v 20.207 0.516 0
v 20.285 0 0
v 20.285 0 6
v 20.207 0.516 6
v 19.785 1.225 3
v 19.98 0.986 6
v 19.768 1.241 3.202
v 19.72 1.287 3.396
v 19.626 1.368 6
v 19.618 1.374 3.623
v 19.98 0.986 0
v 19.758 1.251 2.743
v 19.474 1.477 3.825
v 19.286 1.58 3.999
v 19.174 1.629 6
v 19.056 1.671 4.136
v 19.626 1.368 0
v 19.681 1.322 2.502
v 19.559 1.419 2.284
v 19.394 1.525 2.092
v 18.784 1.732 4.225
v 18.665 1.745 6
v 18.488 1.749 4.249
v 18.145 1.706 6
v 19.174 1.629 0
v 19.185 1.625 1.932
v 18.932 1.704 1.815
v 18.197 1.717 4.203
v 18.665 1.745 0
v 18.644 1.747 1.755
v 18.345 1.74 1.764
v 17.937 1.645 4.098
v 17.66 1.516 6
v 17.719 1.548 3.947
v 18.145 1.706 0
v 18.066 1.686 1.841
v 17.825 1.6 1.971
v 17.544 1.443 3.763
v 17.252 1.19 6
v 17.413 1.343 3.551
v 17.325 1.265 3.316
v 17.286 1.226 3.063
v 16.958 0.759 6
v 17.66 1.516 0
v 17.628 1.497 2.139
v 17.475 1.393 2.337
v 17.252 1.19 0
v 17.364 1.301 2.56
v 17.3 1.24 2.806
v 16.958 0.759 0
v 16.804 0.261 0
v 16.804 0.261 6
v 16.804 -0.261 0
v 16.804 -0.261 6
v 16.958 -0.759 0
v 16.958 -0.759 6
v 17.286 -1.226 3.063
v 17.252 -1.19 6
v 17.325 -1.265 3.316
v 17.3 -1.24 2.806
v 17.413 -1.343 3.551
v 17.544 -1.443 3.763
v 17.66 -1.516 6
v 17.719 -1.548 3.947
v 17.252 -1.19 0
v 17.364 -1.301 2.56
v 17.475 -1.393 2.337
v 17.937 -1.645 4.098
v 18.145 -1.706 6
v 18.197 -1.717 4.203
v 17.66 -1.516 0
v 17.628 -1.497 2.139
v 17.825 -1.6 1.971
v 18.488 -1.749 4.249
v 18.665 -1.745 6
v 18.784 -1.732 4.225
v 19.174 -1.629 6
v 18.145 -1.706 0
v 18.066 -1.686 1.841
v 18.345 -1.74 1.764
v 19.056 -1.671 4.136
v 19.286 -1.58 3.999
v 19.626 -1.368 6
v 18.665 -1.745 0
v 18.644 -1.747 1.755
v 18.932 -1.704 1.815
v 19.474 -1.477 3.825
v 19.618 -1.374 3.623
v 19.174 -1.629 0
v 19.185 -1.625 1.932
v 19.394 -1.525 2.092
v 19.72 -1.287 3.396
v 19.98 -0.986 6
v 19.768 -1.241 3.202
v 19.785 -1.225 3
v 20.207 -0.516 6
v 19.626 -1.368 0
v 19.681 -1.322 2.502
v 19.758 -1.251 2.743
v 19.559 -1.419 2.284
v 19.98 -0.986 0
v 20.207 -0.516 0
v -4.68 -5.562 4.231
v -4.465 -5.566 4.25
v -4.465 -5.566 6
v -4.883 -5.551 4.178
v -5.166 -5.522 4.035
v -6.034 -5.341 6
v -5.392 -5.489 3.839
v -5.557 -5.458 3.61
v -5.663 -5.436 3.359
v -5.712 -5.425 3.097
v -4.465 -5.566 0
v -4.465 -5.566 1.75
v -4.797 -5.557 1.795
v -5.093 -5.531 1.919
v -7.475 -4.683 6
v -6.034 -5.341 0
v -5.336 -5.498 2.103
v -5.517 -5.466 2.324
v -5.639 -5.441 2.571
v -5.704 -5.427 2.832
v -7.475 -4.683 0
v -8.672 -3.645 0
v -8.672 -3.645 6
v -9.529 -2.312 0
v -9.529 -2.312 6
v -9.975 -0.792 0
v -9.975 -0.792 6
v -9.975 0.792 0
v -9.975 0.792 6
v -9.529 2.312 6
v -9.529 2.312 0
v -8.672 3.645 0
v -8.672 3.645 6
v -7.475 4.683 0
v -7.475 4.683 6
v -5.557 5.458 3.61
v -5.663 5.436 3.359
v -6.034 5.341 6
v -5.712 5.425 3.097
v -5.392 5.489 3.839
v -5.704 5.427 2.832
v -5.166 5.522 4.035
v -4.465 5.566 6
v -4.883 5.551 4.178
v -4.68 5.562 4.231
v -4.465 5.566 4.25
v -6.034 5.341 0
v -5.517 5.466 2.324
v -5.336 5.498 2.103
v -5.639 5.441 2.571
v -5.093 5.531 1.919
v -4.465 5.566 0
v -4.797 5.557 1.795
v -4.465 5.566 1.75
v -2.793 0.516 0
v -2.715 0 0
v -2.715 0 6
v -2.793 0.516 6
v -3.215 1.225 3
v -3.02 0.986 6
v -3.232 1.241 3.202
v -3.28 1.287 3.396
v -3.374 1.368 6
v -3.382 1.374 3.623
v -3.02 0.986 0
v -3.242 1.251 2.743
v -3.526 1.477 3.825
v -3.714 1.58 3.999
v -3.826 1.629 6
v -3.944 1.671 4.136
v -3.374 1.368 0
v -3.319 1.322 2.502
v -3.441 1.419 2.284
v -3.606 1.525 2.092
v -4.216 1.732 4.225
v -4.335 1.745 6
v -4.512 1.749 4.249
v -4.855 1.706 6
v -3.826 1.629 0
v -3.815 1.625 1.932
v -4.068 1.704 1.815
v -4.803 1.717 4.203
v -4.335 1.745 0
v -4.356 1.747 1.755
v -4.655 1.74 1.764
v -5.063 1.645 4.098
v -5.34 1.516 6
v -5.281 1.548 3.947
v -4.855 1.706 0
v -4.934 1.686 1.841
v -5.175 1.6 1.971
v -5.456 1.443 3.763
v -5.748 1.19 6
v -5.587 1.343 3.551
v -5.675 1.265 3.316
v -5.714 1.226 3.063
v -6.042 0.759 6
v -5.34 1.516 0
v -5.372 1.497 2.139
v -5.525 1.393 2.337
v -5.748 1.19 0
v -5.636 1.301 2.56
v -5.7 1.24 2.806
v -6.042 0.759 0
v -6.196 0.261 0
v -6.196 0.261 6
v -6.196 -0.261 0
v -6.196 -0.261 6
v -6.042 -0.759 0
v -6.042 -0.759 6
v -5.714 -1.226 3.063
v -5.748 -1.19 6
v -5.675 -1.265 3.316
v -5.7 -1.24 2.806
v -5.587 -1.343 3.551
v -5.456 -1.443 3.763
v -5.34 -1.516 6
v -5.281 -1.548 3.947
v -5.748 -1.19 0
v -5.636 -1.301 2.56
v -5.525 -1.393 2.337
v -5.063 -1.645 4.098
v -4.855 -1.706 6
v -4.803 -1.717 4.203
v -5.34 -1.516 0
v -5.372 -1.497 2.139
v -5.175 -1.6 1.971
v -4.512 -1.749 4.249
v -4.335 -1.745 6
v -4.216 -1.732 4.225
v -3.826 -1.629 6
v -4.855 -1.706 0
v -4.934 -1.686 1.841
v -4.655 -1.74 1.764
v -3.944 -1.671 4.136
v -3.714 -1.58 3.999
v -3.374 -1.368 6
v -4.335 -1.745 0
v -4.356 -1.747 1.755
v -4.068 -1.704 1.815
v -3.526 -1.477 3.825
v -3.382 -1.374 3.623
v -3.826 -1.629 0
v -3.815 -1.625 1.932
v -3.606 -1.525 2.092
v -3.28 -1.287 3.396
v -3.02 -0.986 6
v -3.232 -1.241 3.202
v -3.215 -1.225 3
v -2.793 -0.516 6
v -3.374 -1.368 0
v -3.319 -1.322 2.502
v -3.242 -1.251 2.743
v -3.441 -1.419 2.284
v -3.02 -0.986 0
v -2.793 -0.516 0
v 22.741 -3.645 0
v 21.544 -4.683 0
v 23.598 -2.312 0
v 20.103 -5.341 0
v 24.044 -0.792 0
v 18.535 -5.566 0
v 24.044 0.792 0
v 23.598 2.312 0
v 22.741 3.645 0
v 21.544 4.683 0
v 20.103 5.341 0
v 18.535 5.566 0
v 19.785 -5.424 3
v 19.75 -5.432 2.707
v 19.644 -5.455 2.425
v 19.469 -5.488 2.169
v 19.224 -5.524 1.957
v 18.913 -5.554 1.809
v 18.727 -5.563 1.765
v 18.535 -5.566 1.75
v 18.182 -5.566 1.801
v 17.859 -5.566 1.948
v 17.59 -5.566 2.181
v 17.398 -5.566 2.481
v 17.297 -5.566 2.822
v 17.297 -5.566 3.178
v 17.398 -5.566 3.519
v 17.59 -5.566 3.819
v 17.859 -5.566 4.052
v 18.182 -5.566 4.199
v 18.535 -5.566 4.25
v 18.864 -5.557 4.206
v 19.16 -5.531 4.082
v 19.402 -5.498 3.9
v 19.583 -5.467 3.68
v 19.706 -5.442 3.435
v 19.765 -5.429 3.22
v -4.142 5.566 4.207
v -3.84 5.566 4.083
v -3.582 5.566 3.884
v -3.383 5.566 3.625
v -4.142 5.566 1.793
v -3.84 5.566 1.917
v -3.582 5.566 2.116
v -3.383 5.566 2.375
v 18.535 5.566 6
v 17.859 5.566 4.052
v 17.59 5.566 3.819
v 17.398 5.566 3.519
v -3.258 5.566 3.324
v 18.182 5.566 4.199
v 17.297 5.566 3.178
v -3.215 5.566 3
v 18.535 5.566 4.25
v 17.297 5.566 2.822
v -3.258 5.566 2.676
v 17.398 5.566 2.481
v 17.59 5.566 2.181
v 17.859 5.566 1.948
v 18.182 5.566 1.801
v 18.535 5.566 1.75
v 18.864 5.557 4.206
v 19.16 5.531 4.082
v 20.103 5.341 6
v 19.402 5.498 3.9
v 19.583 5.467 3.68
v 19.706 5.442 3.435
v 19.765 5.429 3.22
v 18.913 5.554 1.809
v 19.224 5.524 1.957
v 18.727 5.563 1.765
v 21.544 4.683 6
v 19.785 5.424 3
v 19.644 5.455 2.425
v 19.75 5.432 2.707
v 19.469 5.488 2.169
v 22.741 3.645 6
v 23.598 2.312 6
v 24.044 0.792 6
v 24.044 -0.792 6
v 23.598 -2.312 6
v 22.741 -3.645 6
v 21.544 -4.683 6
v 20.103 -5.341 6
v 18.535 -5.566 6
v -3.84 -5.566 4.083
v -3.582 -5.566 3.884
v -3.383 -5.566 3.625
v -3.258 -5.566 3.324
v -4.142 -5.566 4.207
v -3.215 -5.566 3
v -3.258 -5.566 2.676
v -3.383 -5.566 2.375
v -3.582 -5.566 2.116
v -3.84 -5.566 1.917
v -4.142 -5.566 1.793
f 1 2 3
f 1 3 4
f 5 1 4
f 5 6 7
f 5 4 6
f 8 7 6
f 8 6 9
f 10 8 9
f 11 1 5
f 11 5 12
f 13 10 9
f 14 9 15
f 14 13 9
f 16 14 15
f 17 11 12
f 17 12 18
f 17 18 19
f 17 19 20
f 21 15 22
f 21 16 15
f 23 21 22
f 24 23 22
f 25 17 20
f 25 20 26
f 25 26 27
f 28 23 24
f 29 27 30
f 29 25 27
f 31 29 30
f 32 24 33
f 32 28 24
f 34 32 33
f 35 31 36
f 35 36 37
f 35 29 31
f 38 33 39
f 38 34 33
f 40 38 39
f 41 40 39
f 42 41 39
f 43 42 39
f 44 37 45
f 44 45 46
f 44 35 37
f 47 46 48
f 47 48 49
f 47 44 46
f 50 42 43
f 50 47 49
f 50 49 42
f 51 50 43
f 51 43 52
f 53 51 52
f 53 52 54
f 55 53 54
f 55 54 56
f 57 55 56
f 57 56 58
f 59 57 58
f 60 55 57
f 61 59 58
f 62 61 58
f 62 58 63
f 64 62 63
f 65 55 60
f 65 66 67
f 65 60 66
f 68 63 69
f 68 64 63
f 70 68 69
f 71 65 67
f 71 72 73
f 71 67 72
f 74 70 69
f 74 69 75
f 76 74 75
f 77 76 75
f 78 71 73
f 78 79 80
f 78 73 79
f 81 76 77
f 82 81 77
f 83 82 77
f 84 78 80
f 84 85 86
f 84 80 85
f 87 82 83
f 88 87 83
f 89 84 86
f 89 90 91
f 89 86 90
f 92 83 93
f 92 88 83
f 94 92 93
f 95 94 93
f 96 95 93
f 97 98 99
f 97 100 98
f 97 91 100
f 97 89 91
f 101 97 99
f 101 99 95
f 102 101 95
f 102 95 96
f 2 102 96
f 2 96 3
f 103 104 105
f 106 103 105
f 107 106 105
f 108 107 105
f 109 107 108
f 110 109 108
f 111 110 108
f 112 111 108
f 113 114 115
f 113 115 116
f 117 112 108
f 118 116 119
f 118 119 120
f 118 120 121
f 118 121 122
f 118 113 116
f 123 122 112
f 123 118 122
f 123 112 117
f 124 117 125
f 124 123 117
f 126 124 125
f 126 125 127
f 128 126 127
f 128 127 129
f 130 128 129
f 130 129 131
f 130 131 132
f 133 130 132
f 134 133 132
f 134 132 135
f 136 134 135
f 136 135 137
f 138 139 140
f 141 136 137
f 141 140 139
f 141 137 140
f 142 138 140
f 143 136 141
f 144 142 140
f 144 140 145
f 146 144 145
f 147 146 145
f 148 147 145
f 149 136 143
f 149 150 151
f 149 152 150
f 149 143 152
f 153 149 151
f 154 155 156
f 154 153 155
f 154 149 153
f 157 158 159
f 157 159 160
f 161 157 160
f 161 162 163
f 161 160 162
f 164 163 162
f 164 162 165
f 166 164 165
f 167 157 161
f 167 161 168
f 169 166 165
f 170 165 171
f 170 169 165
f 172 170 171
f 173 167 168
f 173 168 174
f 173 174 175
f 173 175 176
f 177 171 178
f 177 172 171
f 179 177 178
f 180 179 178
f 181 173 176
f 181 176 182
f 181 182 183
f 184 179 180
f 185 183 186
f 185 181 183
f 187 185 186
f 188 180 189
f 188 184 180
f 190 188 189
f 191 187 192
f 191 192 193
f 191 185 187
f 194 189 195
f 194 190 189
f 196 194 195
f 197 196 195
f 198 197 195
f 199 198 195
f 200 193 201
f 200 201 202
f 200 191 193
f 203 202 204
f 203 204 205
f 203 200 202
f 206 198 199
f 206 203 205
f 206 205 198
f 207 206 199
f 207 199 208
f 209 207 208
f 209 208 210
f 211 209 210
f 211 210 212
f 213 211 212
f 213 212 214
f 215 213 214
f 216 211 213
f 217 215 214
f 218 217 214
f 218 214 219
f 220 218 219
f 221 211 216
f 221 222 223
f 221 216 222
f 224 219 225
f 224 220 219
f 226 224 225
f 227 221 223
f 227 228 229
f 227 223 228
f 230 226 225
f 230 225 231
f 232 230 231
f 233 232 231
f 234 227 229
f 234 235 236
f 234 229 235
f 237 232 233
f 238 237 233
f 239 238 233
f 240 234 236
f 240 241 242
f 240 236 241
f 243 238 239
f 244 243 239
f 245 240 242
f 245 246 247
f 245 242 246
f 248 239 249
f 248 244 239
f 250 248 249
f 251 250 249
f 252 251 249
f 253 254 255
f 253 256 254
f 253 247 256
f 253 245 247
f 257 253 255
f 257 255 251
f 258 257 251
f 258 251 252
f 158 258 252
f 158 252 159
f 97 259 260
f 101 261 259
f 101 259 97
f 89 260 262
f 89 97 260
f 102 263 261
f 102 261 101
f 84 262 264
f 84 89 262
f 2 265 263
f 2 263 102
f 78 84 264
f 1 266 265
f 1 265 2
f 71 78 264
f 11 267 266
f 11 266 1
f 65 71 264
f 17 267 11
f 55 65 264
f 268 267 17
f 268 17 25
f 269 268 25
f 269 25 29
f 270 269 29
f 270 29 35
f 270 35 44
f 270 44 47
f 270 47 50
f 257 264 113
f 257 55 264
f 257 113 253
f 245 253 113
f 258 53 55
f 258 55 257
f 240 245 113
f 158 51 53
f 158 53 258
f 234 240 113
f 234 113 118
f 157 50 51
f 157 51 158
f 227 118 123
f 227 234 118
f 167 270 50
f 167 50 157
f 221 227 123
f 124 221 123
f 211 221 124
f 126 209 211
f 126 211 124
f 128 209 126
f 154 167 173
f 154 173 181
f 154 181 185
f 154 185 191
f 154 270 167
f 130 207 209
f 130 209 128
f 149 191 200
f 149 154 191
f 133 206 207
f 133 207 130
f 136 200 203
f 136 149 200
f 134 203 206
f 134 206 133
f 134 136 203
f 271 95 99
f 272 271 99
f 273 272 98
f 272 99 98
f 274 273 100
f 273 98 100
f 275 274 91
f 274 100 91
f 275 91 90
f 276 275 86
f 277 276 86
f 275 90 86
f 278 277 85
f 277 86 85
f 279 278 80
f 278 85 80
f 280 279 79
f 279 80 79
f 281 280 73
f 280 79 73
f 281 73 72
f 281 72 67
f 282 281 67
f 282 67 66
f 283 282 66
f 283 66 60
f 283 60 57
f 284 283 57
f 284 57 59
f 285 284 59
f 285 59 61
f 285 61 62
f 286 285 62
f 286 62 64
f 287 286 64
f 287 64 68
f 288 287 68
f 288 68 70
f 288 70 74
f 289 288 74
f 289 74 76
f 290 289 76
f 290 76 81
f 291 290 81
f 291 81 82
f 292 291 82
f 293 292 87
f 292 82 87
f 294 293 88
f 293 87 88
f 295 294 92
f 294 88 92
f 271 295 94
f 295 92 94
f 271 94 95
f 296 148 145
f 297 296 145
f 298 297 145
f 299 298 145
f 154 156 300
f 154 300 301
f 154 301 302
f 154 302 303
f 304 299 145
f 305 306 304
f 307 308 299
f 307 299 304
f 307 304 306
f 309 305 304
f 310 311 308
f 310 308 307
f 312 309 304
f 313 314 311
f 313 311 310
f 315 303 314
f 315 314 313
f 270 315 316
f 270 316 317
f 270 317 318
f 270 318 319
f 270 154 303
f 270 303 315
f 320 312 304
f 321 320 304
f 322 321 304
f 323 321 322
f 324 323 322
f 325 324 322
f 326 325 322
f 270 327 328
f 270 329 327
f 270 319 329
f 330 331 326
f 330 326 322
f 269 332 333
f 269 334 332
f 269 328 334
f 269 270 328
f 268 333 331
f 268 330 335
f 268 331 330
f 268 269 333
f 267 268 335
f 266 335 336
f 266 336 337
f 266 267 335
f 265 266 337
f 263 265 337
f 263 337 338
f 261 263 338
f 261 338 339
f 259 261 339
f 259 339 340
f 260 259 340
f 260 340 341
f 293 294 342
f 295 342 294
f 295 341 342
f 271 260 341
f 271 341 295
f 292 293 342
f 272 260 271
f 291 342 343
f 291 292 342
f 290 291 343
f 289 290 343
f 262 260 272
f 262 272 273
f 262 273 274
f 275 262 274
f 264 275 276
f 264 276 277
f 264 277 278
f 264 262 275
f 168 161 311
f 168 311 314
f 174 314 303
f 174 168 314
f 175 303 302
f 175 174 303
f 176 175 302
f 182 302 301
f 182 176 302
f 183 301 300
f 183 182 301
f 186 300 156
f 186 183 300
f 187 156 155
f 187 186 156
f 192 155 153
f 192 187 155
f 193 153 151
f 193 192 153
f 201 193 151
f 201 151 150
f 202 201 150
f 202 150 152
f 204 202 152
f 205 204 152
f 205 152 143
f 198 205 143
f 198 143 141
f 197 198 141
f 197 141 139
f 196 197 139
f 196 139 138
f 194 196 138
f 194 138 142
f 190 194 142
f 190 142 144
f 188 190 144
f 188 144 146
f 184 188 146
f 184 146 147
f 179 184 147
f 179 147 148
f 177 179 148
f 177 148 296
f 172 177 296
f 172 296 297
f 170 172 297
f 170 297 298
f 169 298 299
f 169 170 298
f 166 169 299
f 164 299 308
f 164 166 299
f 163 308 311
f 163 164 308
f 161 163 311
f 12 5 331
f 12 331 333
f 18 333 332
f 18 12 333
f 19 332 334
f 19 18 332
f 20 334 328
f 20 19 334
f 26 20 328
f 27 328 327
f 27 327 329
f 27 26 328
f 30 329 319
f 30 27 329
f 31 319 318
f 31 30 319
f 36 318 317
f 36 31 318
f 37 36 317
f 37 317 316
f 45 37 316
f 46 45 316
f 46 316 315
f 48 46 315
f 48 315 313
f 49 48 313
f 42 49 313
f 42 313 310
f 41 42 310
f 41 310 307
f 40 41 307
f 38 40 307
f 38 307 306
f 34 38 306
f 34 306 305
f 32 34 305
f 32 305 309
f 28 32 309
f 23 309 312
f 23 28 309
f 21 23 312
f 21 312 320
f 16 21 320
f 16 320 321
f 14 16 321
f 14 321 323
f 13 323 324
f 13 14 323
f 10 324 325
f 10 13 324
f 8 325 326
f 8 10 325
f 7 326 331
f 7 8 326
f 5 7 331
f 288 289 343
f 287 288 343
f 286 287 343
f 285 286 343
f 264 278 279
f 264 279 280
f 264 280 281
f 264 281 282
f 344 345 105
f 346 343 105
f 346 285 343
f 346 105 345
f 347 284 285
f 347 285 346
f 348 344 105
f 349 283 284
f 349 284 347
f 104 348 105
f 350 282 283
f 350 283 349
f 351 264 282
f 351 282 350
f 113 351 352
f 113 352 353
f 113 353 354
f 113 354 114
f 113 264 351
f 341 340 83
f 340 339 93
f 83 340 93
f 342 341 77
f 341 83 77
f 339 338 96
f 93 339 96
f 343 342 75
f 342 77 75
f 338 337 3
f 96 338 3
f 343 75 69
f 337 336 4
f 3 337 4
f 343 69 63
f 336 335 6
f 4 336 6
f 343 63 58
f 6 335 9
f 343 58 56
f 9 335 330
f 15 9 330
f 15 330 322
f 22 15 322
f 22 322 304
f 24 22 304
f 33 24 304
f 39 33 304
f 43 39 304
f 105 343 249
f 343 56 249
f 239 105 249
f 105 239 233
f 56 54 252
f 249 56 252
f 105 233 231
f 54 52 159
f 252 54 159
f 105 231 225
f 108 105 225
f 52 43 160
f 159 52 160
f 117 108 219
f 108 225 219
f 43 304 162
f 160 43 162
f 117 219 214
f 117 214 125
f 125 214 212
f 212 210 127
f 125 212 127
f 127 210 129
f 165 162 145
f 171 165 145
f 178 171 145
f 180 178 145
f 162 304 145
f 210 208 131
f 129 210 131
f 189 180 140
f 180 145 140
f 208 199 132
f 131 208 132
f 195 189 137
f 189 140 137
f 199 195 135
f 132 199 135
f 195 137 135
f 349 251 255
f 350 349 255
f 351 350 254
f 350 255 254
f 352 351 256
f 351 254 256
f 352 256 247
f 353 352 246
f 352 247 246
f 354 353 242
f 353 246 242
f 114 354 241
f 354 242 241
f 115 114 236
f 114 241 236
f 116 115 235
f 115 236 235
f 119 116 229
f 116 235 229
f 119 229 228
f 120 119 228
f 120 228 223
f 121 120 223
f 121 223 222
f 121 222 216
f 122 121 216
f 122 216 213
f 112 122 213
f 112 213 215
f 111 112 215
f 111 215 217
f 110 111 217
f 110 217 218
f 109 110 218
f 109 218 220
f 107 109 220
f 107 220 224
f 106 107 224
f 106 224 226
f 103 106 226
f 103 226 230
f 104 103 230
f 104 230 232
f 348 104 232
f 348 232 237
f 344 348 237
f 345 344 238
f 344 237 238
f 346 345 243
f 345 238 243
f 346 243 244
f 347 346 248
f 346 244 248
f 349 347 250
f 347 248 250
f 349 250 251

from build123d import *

# Parameters (mm, degrees)
SKETCH1_R               = 1.75
BOSS_EXTRUDE1_DEPTH     = 6
SKETCH2_R               = 1.25
CUT_EXTRUDE1_DEPTH      = 6.566489362
CUT_EXTRUDE1_DEPTH_BACK = 6.566489362


with BuildPart() as part:
    # Sketch1 → Boss-Extrude1 (new body)
    with BuildSketch(Plane.XY):
        with BuildLine():
            Line((-4.465425532, 5.566489362), (18.534574468, 5.566489362))
            ThreePointArc((18.534574468, 5.566489362), (24.10106383, 0), (18.534574468, -5.566489362))
            Line((18.534574468, -5.566489362), (-4.465425532, -5.566489362))
            ThreePointArc((-4.465425532, -5.566489362), (-10.031914894, 0), (-4.465425532, 5.566489362))
        make_face()
        with Locations((-4.465425532, 0)):
            Circle(SKETCH1_R, mode=Mode.SUBTRACT)
        with Locations((18.534574468, 0)):
            Circle(SKETCH1_R, mode=Mode.SUBTRACT)
    extrude(amount=BOSS_EXTRUDE1_DEPTH)

    # Sketch2 → Cut-Extrude1 (cut, two sides)
    with BuildSketch(Plane(origin=(0, 0, 0), x_dir=(1, 0, 0), z_dir=(0, 1, 0))) as cut_extrude1_sk:
        with Locations((18.534574468, -3)):
            Circle(SKETCH2_R)
        with Locations((-4.465425532, -3)):
            Circle(SKETCH2_R)
    extrude(amount=CUT_EXTRUDE1_DEPTH, mode=Mode.SUBTRACT)
    extrude(cut_extrude1_sk.sketch, amount=-CUT_EXTRUDE1_DEPTH_BACK, mode=Mode.SUBTRACT)


solid = part.part
